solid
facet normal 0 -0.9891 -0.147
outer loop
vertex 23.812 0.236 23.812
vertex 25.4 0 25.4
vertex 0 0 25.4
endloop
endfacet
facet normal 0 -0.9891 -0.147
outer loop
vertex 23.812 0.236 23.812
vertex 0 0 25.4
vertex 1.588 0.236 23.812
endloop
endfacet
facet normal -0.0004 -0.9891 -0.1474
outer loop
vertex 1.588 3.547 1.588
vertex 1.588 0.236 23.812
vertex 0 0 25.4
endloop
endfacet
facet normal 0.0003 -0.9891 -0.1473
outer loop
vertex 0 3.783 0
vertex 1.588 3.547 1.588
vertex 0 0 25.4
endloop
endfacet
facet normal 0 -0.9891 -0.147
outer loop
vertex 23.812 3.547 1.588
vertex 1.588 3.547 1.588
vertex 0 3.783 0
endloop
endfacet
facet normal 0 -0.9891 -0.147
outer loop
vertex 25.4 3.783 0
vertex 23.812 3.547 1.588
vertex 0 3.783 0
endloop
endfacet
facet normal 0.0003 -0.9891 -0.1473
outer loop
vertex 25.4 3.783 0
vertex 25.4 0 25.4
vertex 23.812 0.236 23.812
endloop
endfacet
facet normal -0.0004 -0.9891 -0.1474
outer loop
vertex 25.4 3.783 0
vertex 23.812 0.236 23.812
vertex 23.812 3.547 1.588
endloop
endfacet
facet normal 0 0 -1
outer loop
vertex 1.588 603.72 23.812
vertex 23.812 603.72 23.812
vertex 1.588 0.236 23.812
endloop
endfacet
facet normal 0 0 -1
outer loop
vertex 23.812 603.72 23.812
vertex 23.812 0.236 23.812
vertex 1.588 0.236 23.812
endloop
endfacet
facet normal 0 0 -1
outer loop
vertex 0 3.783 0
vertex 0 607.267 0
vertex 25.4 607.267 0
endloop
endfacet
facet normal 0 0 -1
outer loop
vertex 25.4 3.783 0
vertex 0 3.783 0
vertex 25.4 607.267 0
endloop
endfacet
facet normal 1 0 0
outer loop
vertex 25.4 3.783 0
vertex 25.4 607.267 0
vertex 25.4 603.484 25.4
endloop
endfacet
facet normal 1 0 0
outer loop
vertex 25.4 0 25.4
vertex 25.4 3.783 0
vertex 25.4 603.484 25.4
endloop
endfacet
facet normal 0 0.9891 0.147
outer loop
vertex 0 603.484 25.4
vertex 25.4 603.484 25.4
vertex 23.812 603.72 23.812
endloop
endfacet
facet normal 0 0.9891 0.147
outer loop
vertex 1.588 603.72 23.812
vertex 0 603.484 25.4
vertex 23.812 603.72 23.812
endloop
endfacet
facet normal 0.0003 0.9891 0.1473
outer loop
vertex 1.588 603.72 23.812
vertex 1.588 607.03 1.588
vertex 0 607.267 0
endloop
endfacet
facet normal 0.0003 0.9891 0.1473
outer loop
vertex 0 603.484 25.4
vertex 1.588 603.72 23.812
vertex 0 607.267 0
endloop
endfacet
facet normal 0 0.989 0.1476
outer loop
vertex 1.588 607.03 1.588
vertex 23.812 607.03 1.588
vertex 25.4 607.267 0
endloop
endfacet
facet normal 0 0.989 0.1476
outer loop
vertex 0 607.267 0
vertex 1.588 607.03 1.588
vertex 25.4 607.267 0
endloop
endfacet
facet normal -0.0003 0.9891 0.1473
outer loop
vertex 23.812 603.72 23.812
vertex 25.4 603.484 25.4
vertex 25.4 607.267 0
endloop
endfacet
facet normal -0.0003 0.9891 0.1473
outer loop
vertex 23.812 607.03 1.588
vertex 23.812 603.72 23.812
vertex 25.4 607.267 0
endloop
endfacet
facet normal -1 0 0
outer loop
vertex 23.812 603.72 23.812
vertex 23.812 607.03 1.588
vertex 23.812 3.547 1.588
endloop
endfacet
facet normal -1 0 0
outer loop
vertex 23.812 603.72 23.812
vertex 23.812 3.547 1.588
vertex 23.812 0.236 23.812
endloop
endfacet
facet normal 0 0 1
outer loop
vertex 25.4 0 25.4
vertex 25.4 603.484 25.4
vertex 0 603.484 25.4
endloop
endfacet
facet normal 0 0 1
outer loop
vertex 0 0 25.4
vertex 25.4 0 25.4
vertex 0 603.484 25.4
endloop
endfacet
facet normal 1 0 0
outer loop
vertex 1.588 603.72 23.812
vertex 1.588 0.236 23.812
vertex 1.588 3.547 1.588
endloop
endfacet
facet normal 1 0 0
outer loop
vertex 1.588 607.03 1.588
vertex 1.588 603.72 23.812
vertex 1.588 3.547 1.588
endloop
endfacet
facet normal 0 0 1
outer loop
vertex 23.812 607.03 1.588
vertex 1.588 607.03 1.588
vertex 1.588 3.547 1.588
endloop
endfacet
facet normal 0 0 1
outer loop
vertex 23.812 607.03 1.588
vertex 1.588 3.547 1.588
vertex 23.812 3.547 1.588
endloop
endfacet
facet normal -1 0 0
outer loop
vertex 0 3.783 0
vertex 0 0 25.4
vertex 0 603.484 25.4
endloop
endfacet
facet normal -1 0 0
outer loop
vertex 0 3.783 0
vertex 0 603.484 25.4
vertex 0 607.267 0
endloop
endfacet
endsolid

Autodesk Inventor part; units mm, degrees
ref_plane "YZ Plane" through (0, 0, 0) normal (1, 0, 0) x (0, 1, 0)
ref_plane "XZ Plane" through (0, 0, 0) normal (0, 1, 0) x (-1, 0, 0)
ref_plane "XY Plane" through (0, 0, 0) normal (0, 0, 1) x (1, 0, 0)
sketch "Sketch1" plane through (0, 0, 0) normal (0, 1, 0) x (-1, 0, 0)
  line L0 (0, 0) -> (-25.4, 0)
  line L1 (-25.4, 0) -> (-25.4, 25.4)
  line L2 (-25.4, 25.4) -> (0, 25.4)
  line L3 (0, 25.4) -> (0, 0)
  line L4 (-1.5875, 1.5875) -> (-23.8125, 1.5875)
  line L5 (-23.8125, 1.5875) -> (-23.8125, 23.8125)
  line L6 (-23.8125, 23.8125) -> (-1.5875, 23.8125)
  line L7 (-1.5875, 23.8125) -> (-1.5875, 1.5875)
  dimension "d0" = 25.4
  dimension "d2" = 25.4
  dimension "d3" = 1.5875
extrude "Extrusion1" add sketch "Sketch1" along normal blind 762
sketch "Sketch2" plane through (25.4, 0, 25.4) normal (1, 0, 0) x (0, 0, -1)
  line L0 (25.4, 0) -> (0, 0) projected
  line L1 (25.4, 0) -> (25.4, 762) projected
  line L2 (0, 762) -> (25.4, 762) projected
  line L3 (0, 0) -> (0, 762) projected
  line L4 (0, 0) -> (25.4, 3.783)
  line L5 (0, 603.4839) -> (25.4, 607.2669)
  dimension "d6" = 596.9
  dimension "d8" = 603.4839
extrude "Extrusion2" cut sketch "Sketch2" against normal blind 762 contours L0 L4 L1 | L3 L2 L1 L5
properties part number "Square Tube 5" material "Aluminum 6061"
